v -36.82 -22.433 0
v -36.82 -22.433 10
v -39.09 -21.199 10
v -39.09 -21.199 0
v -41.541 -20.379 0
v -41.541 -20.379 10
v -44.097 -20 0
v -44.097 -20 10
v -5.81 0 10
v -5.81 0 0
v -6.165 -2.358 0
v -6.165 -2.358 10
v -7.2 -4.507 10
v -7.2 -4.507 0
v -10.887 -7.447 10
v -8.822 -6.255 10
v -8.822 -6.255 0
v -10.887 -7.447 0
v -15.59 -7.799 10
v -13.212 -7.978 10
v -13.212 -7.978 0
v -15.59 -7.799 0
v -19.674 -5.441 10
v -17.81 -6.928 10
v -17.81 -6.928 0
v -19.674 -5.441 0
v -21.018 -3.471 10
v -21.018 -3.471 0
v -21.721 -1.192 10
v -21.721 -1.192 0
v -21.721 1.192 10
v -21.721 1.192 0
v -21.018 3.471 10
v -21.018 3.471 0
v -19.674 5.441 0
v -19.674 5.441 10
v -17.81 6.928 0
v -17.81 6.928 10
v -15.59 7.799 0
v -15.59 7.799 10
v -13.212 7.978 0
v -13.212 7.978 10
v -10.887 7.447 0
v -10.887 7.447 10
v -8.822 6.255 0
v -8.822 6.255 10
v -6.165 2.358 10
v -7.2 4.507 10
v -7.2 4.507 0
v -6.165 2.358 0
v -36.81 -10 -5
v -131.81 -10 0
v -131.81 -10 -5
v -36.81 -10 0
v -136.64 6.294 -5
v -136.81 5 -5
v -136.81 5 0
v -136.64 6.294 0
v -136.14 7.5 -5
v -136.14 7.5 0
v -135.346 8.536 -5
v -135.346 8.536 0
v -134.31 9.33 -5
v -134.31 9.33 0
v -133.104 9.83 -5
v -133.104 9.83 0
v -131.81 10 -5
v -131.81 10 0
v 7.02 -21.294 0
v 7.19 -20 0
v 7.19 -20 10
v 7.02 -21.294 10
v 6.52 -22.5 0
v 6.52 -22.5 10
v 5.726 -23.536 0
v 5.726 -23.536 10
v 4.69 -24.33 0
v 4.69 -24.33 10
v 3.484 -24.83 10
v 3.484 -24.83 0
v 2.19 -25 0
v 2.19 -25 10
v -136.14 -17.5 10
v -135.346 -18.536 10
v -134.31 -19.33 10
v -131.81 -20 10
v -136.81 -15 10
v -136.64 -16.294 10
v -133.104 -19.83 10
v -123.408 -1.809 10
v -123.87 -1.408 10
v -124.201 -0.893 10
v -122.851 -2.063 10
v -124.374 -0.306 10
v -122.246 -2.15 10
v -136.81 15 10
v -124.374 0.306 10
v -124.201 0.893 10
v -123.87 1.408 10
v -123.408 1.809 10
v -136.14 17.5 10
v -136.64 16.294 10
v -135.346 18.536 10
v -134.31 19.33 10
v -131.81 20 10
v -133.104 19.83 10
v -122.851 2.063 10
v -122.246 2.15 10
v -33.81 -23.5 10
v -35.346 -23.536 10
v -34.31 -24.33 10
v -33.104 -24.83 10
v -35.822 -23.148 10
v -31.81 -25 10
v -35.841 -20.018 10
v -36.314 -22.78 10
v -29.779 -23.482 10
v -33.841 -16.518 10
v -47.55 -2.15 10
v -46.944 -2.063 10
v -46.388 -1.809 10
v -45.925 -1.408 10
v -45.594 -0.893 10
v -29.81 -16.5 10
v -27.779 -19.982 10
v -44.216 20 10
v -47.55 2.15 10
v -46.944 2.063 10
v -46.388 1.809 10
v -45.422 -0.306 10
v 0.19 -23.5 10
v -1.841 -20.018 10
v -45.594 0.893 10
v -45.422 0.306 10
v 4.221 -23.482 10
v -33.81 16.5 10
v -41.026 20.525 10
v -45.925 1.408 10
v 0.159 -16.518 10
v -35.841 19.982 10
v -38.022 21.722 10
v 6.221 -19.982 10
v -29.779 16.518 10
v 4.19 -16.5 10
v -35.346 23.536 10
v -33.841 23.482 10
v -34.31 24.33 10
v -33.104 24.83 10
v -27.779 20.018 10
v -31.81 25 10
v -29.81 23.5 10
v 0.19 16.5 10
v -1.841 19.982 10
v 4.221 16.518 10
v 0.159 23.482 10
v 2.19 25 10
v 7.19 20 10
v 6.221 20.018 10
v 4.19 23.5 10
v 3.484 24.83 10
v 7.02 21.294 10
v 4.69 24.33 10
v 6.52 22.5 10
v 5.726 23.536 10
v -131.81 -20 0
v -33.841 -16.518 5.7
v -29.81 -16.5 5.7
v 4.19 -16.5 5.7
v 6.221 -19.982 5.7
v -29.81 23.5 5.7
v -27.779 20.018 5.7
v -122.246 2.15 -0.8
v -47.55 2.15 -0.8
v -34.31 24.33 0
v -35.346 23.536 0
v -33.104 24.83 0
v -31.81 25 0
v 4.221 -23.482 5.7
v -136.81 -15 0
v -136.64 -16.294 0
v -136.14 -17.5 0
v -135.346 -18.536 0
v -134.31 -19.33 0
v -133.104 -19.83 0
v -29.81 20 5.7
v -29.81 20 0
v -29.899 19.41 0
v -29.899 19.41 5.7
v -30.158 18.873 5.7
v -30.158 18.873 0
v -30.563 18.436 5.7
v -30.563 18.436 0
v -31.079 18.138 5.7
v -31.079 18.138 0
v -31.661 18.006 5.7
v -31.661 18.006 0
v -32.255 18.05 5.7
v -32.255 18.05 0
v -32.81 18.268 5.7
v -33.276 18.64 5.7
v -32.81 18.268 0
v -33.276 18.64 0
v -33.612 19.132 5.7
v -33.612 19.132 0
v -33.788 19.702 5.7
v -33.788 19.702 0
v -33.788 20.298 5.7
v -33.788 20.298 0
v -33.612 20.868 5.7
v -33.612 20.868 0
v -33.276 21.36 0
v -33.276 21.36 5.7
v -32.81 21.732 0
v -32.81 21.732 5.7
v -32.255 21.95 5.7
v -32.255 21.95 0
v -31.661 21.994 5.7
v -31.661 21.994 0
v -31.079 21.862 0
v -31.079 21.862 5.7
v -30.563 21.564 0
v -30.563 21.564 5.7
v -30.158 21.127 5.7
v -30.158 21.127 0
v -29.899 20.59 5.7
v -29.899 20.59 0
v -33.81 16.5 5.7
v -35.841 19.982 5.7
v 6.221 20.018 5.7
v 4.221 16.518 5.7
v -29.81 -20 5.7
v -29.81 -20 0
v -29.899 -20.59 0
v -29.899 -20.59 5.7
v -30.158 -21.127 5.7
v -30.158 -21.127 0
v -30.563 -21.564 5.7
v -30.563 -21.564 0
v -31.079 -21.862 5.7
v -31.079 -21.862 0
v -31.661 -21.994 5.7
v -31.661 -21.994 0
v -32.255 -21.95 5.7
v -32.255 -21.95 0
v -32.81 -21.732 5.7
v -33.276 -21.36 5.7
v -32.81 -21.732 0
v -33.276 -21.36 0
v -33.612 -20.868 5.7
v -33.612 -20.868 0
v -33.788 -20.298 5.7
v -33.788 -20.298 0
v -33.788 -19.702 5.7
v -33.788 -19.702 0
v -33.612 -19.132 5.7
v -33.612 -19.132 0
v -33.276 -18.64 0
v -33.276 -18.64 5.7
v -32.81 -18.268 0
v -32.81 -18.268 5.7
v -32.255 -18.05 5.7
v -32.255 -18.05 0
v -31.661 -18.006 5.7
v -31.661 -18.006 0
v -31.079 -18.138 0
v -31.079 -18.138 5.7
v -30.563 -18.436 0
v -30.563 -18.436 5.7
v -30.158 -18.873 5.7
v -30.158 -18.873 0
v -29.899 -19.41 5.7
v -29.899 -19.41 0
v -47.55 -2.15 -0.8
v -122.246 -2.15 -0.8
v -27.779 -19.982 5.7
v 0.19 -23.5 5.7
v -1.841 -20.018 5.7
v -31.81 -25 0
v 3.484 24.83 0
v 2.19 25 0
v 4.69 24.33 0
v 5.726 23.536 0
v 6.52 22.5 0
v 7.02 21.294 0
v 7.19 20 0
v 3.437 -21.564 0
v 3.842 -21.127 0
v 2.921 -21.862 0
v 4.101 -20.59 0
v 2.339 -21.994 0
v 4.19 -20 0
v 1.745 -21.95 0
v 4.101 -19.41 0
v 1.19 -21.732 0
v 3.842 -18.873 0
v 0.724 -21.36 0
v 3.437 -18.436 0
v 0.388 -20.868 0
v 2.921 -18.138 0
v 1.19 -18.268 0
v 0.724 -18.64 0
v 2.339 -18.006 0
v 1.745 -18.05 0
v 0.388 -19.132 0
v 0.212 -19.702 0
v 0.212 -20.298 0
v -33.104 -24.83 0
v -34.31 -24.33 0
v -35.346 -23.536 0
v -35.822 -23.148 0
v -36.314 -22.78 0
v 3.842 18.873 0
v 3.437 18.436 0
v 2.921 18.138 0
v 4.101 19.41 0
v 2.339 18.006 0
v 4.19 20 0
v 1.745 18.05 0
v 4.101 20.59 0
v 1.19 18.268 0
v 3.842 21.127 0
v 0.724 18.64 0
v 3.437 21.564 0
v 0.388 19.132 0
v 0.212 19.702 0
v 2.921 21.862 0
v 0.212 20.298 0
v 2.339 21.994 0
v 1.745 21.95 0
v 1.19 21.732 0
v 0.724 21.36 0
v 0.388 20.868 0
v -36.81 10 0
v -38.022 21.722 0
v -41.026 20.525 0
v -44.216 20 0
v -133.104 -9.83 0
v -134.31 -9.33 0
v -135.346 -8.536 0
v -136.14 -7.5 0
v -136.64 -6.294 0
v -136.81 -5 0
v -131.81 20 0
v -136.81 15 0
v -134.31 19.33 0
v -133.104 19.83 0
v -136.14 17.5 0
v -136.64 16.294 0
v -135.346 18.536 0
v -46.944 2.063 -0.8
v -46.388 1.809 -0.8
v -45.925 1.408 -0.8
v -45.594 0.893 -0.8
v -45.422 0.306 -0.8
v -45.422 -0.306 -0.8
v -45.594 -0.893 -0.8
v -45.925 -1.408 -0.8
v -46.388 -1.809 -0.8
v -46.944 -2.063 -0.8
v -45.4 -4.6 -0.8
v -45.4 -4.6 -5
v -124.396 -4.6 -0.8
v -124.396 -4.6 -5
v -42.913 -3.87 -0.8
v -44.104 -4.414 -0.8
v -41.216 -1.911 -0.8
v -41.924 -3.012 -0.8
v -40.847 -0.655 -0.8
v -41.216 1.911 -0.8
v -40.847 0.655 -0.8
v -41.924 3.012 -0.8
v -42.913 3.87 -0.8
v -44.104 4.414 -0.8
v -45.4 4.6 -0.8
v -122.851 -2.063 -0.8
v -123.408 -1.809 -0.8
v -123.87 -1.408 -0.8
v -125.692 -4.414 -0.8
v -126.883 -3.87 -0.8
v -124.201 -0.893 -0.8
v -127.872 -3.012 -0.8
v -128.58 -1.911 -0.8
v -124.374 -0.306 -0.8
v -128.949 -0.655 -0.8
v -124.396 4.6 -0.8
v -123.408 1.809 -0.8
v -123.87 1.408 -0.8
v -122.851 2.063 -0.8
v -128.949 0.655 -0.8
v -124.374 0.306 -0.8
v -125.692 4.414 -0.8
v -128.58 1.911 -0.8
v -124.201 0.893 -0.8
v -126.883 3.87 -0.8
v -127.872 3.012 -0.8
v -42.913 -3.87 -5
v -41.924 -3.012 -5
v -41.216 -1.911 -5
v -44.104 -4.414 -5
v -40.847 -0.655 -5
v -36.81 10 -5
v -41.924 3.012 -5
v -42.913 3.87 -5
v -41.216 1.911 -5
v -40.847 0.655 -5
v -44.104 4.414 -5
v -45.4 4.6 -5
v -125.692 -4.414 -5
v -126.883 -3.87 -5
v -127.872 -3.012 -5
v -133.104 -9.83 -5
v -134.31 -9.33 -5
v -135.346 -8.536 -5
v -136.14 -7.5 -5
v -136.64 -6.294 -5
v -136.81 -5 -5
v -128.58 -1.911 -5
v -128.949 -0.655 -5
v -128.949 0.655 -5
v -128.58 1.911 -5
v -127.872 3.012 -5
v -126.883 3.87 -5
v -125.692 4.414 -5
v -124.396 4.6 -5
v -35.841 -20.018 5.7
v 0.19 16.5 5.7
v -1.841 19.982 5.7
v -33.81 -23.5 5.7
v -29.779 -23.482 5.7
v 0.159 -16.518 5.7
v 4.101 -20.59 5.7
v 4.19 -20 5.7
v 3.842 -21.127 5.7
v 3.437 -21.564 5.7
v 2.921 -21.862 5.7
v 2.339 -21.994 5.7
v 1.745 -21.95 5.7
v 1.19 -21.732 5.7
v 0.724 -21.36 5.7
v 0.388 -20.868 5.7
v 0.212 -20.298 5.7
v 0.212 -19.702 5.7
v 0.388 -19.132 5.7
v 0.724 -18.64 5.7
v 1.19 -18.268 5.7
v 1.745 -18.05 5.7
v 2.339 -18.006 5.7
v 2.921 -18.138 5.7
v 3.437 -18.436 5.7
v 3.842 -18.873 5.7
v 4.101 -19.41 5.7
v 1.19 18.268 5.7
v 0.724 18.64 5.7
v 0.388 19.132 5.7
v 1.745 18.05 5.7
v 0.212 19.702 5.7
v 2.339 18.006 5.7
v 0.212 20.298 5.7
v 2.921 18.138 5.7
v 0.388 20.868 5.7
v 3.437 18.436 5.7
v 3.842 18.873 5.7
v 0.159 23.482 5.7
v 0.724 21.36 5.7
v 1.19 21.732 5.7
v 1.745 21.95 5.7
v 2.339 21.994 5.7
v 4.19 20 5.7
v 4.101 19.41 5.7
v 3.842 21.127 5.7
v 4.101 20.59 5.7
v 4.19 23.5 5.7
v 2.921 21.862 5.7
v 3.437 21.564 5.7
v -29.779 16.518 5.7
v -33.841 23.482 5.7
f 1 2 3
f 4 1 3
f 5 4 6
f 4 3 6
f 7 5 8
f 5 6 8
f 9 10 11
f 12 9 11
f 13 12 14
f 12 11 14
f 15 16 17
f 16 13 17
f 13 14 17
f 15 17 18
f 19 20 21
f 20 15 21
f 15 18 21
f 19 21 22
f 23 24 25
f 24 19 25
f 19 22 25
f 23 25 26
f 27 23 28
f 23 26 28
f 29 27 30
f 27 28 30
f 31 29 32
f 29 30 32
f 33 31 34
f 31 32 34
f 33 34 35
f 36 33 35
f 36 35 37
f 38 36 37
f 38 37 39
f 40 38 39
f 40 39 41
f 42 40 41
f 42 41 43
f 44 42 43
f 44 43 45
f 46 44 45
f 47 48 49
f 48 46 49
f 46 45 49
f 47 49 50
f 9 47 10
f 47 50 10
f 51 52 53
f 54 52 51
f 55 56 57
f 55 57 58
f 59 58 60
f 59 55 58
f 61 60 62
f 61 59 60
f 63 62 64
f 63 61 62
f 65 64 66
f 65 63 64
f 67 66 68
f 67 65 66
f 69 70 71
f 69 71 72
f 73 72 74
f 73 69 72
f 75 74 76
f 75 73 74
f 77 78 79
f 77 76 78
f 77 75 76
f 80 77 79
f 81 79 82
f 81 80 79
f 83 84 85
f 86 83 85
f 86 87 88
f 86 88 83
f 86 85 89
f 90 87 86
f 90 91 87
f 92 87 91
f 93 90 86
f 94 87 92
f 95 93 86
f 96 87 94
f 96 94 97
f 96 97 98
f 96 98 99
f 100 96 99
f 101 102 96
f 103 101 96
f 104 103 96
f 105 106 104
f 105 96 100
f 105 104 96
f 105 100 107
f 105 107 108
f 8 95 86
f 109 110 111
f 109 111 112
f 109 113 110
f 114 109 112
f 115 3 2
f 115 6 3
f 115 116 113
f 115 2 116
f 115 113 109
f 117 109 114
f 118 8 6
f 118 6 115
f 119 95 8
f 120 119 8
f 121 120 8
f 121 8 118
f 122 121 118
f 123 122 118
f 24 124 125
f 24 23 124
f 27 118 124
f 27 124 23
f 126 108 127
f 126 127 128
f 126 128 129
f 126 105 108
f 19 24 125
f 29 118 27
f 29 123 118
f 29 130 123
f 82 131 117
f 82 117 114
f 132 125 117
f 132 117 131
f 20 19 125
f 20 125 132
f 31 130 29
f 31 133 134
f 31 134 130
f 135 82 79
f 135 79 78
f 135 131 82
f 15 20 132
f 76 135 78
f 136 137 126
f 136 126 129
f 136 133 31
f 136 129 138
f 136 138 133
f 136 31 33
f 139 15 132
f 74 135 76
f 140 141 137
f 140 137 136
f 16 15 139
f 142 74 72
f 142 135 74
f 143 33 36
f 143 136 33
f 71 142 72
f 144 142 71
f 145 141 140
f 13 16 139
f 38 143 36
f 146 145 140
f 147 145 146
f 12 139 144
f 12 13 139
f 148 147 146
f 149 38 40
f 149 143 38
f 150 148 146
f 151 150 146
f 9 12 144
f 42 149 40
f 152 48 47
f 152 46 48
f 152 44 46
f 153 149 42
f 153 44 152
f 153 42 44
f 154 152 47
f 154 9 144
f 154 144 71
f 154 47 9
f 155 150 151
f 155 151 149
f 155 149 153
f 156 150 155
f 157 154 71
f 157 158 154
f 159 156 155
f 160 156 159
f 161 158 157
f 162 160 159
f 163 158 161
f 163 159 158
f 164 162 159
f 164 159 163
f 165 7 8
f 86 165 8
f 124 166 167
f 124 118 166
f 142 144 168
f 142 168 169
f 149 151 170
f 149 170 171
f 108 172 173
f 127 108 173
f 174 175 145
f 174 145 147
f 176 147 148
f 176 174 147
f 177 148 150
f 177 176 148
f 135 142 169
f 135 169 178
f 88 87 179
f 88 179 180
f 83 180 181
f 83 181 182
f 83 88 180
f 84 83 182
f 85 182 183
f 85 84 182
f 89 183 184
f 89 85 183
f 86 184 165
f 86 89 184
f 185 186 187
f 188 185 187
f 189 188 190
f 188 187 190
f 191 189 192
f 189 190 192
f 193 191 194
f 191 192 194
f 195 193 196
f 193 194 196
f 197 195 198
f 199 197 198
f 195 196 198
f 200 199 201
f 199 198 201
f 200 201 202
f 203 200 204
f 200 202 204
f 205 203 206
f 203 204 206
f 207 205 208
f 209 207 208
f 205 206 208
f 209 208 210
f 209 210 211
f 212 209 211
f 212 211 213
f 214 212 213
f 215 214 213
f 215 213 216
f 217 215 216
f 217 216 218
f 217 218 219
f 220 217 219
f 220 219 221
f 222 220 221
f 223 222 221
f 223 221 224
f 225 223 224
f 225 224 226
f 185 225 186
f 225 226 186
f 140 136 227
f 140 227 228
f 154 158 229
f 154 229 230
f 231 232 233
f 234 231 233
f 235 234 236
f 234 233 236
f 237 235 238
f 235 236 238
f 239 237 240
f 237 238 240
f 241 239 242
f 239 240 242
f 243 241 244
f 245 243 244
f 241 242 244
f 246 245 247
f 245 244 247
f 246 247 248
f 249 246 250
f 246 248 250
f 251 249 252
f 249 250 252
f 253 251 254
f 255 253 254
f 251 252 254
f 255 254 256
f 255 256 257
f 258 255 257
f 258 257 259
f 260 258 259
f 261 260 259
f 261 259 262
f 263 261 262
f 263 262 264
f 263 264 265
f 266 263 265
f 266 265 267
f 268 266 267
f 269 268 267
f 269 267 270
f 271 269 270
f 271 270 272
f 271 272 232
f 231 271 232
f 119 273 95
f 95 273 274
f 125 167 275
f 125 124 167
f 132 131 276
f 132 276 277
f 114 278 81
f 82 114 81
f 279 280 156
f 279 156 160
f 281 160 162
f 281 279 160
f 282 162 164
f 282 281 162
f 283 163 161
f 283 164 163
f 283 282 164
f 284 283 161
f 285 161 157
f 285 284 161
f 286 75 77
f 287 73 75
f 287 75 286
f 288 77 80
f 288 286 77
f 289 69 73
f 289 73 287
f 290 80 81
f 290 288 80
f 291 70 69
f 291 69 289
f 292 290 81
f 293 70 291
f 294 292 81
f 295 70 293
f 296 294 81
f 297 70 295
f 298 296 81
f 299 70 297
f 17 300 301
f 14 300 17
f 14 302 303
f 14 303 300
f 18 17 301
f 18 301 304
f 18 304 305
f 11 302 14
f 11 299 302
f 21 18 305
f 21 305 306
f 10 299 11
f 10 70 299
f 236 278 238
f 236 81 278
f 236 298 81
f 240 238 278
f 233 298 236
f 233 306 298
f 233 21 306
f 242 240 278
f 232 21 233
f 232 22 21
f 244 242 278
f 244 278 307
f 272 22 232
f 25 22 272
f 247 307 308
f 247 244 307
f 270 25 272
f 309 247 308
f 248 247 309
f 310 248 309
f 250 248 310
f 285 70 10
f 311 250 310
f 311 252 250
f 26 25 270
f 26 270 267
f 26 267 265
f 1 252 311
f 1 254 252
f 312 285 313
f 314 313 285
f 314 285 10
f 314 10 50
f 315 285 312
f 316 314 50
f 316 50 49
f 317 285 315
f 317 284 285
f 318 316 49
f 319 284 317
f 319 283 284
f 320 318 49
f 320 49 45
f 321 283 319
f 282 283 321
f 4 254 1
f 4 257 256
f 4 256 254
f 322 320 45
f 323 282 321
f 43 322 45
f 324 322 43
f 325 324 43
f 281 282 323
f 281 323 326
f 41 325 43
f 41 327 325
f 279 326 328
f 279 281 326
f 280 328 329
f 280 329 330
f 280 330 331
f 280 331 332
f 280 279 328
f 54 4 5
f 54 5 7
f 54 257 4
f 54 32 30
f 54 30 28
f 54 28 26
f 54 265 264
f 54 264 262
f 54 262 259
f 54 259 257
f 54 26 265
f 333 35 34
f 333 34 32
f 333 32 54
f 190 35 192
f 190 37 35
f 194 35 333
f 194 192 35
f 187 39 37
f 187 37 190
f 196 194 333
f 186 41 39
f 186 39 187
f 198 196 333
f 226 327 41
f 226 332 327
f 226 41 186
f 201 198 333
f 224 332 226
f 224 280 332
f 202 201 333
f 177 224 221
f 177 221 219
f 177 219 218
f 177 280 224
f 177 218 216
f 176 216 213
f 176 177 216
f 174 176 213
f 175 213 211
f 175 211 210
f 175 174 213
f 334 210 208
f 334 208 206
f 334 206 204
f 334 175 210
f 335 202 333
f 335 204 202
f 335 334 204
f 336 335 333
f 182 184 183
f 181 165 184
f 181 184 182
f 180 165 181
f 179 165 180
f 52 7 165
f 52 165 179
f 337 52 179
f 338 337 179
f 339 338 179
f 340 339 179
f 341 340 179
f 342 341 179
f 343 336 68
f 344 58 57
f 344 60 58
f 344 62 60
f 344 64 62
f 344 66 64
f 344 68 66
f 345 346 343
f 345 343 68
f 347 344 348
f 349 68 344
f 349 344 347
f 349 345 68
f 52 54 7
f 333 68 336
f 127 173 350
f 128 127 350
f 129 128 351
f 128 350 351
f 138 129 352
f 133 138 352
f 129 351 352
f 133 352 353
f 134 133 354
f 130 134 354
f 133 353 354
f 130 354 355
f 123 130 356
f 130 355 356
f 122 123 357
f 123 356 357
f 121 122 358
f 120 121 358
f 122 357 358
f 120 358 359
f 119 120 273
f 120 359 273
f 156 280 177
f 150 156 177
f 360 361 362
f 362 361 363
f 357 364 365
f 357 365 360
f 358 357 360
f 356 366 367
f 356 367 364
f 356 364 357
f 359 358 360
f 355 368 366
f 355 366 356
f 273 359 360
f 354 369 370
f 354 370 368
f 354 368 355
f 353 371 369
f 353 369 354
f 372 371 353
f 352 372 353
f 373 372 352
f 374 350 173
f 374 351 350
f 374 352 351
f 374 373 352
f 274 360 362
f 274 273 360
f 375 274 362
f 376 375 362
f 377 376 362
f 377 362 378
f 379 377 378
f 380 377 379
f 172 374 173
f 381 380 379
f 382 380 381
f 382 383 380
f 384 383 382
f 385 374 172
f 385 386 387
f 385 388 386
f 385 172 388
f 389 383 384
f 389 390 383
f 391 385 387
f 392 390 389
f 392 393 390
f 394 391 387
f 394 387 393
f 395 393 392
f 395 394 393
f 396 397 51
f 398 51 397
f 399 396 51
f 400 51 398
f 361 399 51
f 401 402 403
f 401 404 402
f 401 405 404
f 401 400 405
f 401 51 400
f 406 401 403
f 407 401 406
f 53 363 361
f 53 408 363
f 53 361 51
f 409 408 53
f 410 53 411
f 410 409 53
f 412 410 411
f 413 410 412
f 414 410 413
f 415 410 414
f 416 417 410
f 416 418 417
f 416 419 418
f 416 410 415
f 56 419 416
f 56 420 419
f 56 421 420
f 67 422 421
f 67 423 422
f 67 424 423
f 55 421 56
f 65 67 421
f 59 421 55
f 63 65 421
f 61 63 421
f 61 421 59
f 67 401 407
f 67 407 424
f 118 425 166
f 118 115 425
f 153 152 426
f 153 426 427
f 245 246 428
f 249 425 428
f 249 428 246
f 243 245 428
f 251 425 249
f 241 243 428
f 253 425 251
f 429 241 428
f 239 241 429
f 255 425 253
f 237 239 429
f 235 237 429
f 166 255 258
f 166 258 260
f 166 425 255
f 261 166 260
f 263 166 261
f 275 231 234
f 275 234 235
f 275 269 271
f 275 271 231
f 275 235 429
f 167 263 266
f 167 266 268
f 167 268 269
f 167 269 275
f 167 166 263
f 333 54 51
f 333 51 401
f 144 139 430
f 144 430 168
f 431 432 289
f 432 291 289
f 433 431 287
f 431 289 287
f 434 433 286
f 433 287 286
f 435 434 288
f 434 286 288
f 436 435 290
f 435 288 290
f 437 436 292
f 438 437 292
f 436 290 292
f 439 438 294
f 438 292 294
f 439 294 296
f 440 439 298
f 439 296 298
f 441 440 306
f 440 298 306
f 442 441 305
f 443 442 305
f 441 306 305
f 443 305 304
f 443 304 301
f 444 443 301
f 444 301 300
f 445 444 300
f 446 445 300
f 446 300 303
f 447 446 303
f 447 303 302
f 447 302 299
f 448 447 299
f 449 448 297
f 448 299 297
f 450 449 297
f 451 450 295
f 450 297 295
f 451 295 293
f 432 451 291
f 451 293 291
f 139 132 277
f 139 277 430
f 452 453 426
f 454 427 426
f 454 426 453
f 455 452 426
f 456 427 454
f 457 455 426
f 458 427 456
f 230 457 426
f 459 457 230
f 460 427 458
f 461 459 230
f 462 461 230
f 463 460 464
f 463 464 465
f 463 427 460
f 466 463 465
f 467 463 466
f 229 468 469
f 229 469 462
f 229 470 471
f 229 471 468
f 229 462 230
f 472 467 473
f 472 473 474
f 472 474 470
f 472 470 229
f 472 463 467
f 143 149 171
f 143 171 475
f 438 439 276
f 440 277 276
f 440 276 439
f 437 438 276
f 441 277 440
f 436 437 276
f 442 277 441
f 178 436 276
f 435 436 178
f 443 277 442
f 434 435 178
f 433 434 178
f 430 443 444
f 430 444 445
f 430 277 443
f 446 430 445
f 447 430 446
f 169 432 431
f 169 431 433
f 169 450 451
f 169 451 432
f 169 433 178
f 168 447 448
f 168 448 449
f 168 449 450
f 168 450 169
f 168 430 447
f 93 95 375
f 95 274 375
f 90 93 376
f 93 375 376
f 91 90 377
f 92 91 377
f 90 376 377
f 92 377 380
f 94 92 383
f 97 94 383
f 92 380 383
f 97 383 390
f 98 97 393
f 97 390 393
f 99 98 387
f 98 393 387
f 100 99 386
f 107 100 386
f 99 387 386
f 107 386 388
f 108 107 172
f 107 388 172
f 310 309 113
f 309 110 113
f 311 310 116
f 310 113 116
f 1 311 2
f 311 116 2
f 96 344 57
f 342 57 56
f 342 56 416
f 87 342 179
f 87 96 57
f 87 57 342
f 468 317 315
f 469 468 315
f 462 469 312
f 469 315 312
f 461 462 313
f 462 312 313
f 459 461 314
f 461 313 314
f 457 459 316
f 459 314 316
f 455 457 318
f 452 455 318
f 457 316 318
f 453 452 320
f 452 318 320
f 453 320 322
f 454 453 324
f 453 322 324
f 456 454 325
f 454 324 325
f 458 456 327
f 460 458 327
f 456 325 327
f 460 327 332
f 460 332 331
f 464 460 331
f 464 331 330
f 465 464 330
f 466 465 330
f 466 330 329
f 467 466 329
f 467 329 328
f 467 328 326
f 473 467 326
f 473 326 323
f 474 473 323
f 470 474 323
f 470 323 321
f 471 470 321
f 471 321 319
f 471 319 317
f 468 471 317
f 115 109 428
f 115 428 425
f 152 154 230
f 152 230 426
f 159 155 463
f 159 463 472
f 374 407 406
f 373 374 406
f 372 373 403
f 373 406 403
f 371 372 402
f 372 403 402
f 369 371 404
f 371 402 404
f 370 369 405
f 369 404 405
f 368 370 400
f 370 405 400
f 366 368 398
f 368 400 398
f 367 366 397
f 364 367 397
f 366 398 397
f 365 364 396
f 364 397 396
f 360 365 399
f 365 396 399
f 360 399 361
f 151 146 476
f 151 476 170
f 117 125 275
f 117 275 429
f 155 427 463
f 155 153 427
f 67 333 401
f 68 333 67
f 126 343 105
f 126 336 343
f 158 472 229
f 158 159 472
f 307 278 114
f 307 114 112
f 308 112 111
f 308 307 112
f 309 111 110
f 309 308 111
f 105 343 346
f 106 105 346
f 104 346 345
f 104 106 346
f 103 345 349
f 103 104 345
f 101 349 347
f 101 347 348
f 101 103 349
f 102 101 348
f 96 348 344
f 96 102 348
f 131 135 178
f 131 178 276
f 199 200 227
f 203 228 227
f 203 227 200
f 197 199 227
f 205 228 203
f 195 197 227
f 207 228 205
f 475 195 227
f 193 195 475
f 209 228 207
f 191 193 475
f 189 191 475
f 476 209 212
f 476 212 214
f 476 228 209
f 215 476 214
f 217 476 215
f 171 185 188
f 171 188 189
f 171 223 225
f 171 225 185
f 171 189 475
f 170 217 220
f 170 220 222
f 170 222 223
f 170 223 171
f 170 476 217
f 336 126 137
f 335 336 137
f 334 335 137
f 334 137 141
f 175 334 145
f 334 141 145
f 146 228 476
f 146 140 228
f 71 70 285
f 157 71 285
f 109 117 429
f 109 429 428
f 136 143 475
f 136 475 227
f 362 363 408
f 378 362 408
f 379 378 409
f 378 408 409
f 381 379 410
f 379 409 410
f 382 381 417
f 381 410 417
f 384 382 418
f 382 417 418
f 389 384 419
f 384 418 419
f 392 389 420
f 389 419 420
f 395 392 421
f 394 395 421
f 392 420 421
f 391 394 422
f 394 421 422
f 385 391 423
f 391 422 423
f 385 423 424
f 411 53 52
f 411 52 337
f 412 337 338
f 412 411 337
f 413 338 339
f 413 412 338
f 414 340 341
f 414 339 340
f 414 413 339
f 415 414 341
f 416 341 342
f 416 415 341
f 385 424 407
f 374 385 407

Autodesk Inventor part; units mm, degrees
ref_plane "YZ Plane" through (0, 0, 0) normal (1, 0, 0) x (0, 1, 0)
ref_plane "XZ Plane" through (0, 0, 0) normal (0, 1, 0) x (-1, 0, 0)
ref_plane "XY Plane" through (0, 0, 0) normal (0, 0, 1) x (1, 0, 0)
sketch "Skizze1" plane through (0, 0, 0) normal (0, 0, 1) x (1, 0, 0)
  circle A0 centre (2.19, 20) radius 2 projected
  circle A1 centre (-31.81, 20) radius 2 projected
  arc A2 (-31.81, 25) -> (-36.81, 20) centre (-31.81, 20) ccw projected
  line L0 (-36.81, 20) -> (-36.81, 16) projected
  line L1 (7.19, 16) -> (7.19, 20) projected
  arc A3 (7.19, 20) -> (2.19, 25) centre (2.19, 20) ccw projected
  line L2 (2.19, 25) -> (-31.81, 25) projected
  circle A4 centre (2.19, -20) radius 2 projected
  circle A5 centre (-31.81, -20) radius 2 projected
  arc A6 (-36.81, -20) -> (-31.81, -25) centre (-31.81, -20) ccw projected
  line L3 (-31.81, -25) -> (2.19, -25) projected
  arc A7 (2.19, -25) -> (7.19, -20) centre (2.19, -20) ccw projected
  line L4 (7.19, -20) -> (7.19, -16) projected
  line L5 (-36.81, -16) -> (-36.81, -20) projected
  line L6 (-29.81, -10) -> (-36.81, -10) projected
  line L7 (-36.81, -16) -> (-36.81, -10) projected
  line L8 (7.19, 16) -> (7.19, -16) projected
  line L9 (-36.81, 10) -> (-36.81, 16) projected
  line L10 (-36.81, 10) -> (-29.81, 10) projected
  line L11 (-29.81, 10) -> (-29.81, -10) projected
  circle A8 centre (-13.81, 0) radius 8 projected
  point P0 (0, 0)
extrude "Extrusion1" add sketch "Skizze1" along normal blind 10
sketch "Skizze3" plane through (-36.81, 10, 0) normal (-1, 0, 0) x (0, 0, 1)
  line L0 (0, 10) -> (0, 0) projected
  line L1 (0, 0) -> (10, 0) projected
  line L2 (10, 10) -> (10, 0) projected
  line L3 (0, 10) -> (10, 10) projected
  line L4 (0, -20) -> (0, -30) projected
  line L5 (0, -30) -> (10, -30) projected
  line L6 (10, -20) -> (10, -30) projected
  line L7 (0, -20) -> (10, -20) projected
  line L8 (10, -0.1675) -> (10, -20.1669) projected
  line L9 (0, 0) -> (0, -20) projected
  line L10 (10, -35) -> (10, -30) projected
  line L11 (0, 10) -> (10, 10)
  line L12 (10, 10) -> (10, -30)
  line L13 (10, -30) -> (0, -30)
  line L14 (0, -30) -> (0, 10)
  point P0 (0, -10)
extrude "Extrusion3" add sketch "Skizze3" along normal blind 100
sketch "Skizze4" plane through (0, 0, 10) normal (0, 0, 1) x (1, 0, 0)
  line L0 (-36.81, 20) -> (-136.81, 20) projected
  arc A0 (-31.81, 25) -> (-36.81, 20) centre (-31.81, 20) ccw projected
  line L1 (-36.81, 20) -> (-136.81, 20) projected
  arc A1 (-31.81, 25) -> (-36.81, 20) centre (-31.81, 20) ccw projected
  arc A2 (-45.8607, 20) -> (-35.3455, 23.5355) centre (-45.0384, 34.959) ccw
  line L2 (-44.2162, 20) -> (-36.81, 20)
  arc A3 (-35.3455, 23.5355) -> (-36.81, 20) centre (-31.81, 20) ccw
  line L3 (-45.8607, 0) -> (-28.5304, 0)
  line L4 (-36.81, -20) -> (-136.81, -20)
  arc A4 (-36.81, -20) -> (-31.81, -25) centre (-31.81, -20) ccw
  arc A5 (-35.3455, -23.5355) -> (-45.8607, -20) centre (-45.0384, -34.959) ccw
  line L5 (-36.81, -20) -> (-136.81, -20) projected
  line L6 (-44.2159, -20) -> (-36.81, -20)
  arc A6 (-36.81, -20) -> (-31.81, -25) centre (-31.81, -20) ccw projected
  arc A7 (-36.81, -20) -> (-31.81, -25) centre (-31.81, -20) ccw
  arc A8 (-35.1548, -23.7165) -> (-45.8607, -20) centre (-44.9788, -34.7378) ccw
  point P0 (0, 0)
extrude "Extrusion4" add sketch "Skizze4" against normal blind 10 contours L0 A2 A0 | L4 A4 A5 A8
fillet "Rundung1" radius 5 2 edges at (-136.81, 20, 5) (-136.81, -20, 5)
sketch "Skizze10" plane through (0, 0, 0) normal (0, 0, -1) x (-1, 0, 0)
  line L0 (36.8821, 9.8325) -> (29.8823, 9.8834) construction
  line L1 (29.7369, -10.116) -> (36.7367, -10.1669) construction
  line L2 (36.81, 10) -> (29.81, 10) projected
  line L3 (29.81, -10) -> (36.81, -10) projected
  line L4 (136.81, 15) -> (136.81, -15) projected
  line L5 (36.81, 10) -> (136.81, 10)
  line L6 (136.81, 10) -> (136.81, -10)
  line L7 (136.81, -10) -> (36.81, -10)
  line L8 (36.81, -10) -> (36.81, 10)
  point P0 (0, 0)
extrude "Extrusion10" add sketch "Skizze10" along normal blind 5
fillet "Rundung3" radius 5 2 edges at (-136.81, 10, -2.5) (-136.81, -10, -2.5)
sketch "Skizze11" plane through (0, 0, -5) normal (0, 0, -1) x (-1, 0, 0)
  line L0 (131.81, 10) -> (36.81, 10) construction
  line L1 (36.81, -10) -> (131.81, -10) construction
  line L2 (40.8, 0) -> (128.9956, 0) construction
  line L3 (45.4, -4.6) -> (124.3956, -4.6)
  line L4 (124.3956, 4.6) -> (45.4, 4.6)
  arc A0 (45.4, 4.6) -> (45.4, -4.6) centre (45.4, 0) ccw
  arc A1 (124.3956, -4.6) -> (124.3956, 4.6) centre (124.3956, 0) ccw
  point P0 (0, 0)
  point P1 (84.8978, 0)
  dimension "d40" = 9.2
extrude "Extrusion11" cut sketch "Skizze11" against normal blind 4.2
sketch "Skizze12" plane through (0, 0, -0.8) normal (0, 0, -1) x (-1, 0, 0)
  line L0 (124.3956, -4.6) -> (45.4, -4.6) projected
  arc A0 (124.3956, -4.6) -> (124.3956, 4.6) centre (124.3956, 0) ccw projected
  line L1 (45.4, 4.6) -> (124.3956, 4.6) projected
  arc A1 (45.4, 4.6) -> (45.4, -4.6) centre (45.4, 0) ccw projected
  line L2 (45.4, 0) -> (124.3956, 0) construction
  line L3 (47.55, -2.15) -> (122.2456, -2.15)
  line L4 (122.2456, 2.15) -> (47.55, 2.15)
  arc A2 (47.55, 2.15) -> (47.55, -2.15) centre (47.55, 0) ccw
  arc A3 (122.2456, -2.15) -> (122.2456, 2.15) centre (122.2456, 0) ccw
  point P0 (0, 0)
  point P1 (84.8978, 0)
  dimension "d43" = 4.3
extrude "Extrusion12" cut sketch "Skizze12" against normal through all contours A2 L4 A3 L3
sketch "Skizze13" plane through (0, 0, 10) normal (0, 0, 1) x (1, 0, 0)
  circle A0 centre (-31.81, 20) radius 2 construction
  circle A1 centre (2.19, 20) radius 2 construction
  circle A2 centre (2.19, -20) radius 2 construction
  circle A3 centre (-31.81, -20) radius 2 construction
  line L0 (-31.81, 20) -> (2.19, 20) construction
  line L1 (2.19, 20) -> (2.19, -20) construction
  line L2 (-31.81, 20) -> (-31.81, 23.5) construction
  line L3 (-31.81, 23.5) -> (-29.9614, 23.5)
  line L4 (-29.9614, 23.5) -> (-33.1306, 23.5)
  line L5 (-29.81, 23.5) -> (-27.7789, 20.0179)
  line L6 (-27.7789, 20.0179) -> (-29.7789, 16.5179)
  line L7 (-29.7789, 16.5179) -> (-33.81, 16.5)
  line L8 (-33.81, 16.5) -> (-35.8411, 19.9821)
  line L9 (-35.8411, 19.9821) -> (-33.8411, 23.4821)
  line L10 (-33.8411, 23.4821) -> (-29.81, 23.5)
  line L11 (2.19, 20) -> (2.19, 23.5) construction
  line L12 (2.19, 23.5) -> (4.0386, 23.5)
  line L13 (4.0386, 23.5) -> (0.8694, 23.5)
  line L14 (4.19, 23.5) -> (6.2211, 20.0179)
  line L15 (6.2211, 20.0179) -> (4.2211, 16.5179)
  line L16 (4.2211, 16.5179) -> (0.19, 16.5)
  line L17 (0.19, 16.5) -> (-1.8411, 19.9821)
  line L18 (-1.8411, 19.9821) -> (0.1589, 23.4821)
  line L19 (0.1589, 23.4821) -> (4.19, 23.5)
  line L20 (-31.81, -20) -> (-31.81, -16.5) construction
  line L21 (-31.81, -16.5) -> (-29.9614, -16.5)
  line L22 (-29.9614, -16.5) -> (-33.1306, -16.5)
  line L23 (-29.81, -16.5) -> (-27.7789, -19.9821)
  line L24 (-27.7789, -19.9821) -> (-29.7789, -23.4821)
  line L25 (-29.7789, -23.4821) -> (-33.81, -23.5)
  line L26 (-33.81, -23.5) -> (-35.8411, -20.0179)
  line L27 (-35.8411, -20.0179) -> (-33.8411, -16.5179)
  line L28 (-33.8411, -16.5179) -> (-29.81, -16.5)
  line L29 (2.19, -20) -> (2.19, -16.5) construction
  line L30 (2.19, -16.5) -> (4.0386, -16.5)
  line L31 (4.0386, -16.5) -> (0.8694, -16.5)
  line L32 (4.19, -16.5) -> (6.2211, -19.9821)
  line L33 (6.2211, -19.9821) -> (4.2211, -23.4821)
  line L34 (4.2211, -23.4821) -> (0.19, -23.5)
  line L35 (0.19, -23.5) -> (-1.8411, -20.0179)
  line L36 (-1.8411, -20.0179) -> (0.1589, -16.5179)
  line L37 (0.1589, -16.5179) -> (4.19, -16.5)
  point P0 (0, 0)
  dimension "d61" = 3.5
  dimension "d64" = 34
  dimension "d67" = 40
extrude "Extrusion14" cut sketch "Skizze13" against normal blind 4.3
sketch "Skizze14" plane through (0, 0, 0) normal (0, 0, -1) x (-1, 0, 0)
  line L0 (29.81, 10) -> (29.81, -10) projected
  line L1 (36.81, 10) -> (29.81, 10) projected
  line L2 (36.81, -16.5129) -> (36.81, 16.5129) projected
  line L3 (29.81, -10) -> (36.81, -10) projected
  point P0 (0, 0)
extrude "Extrusion15" add sketch "Skizze14" against normal up to surface (10 mm away)
properties part number "Bearing_support_inside"
